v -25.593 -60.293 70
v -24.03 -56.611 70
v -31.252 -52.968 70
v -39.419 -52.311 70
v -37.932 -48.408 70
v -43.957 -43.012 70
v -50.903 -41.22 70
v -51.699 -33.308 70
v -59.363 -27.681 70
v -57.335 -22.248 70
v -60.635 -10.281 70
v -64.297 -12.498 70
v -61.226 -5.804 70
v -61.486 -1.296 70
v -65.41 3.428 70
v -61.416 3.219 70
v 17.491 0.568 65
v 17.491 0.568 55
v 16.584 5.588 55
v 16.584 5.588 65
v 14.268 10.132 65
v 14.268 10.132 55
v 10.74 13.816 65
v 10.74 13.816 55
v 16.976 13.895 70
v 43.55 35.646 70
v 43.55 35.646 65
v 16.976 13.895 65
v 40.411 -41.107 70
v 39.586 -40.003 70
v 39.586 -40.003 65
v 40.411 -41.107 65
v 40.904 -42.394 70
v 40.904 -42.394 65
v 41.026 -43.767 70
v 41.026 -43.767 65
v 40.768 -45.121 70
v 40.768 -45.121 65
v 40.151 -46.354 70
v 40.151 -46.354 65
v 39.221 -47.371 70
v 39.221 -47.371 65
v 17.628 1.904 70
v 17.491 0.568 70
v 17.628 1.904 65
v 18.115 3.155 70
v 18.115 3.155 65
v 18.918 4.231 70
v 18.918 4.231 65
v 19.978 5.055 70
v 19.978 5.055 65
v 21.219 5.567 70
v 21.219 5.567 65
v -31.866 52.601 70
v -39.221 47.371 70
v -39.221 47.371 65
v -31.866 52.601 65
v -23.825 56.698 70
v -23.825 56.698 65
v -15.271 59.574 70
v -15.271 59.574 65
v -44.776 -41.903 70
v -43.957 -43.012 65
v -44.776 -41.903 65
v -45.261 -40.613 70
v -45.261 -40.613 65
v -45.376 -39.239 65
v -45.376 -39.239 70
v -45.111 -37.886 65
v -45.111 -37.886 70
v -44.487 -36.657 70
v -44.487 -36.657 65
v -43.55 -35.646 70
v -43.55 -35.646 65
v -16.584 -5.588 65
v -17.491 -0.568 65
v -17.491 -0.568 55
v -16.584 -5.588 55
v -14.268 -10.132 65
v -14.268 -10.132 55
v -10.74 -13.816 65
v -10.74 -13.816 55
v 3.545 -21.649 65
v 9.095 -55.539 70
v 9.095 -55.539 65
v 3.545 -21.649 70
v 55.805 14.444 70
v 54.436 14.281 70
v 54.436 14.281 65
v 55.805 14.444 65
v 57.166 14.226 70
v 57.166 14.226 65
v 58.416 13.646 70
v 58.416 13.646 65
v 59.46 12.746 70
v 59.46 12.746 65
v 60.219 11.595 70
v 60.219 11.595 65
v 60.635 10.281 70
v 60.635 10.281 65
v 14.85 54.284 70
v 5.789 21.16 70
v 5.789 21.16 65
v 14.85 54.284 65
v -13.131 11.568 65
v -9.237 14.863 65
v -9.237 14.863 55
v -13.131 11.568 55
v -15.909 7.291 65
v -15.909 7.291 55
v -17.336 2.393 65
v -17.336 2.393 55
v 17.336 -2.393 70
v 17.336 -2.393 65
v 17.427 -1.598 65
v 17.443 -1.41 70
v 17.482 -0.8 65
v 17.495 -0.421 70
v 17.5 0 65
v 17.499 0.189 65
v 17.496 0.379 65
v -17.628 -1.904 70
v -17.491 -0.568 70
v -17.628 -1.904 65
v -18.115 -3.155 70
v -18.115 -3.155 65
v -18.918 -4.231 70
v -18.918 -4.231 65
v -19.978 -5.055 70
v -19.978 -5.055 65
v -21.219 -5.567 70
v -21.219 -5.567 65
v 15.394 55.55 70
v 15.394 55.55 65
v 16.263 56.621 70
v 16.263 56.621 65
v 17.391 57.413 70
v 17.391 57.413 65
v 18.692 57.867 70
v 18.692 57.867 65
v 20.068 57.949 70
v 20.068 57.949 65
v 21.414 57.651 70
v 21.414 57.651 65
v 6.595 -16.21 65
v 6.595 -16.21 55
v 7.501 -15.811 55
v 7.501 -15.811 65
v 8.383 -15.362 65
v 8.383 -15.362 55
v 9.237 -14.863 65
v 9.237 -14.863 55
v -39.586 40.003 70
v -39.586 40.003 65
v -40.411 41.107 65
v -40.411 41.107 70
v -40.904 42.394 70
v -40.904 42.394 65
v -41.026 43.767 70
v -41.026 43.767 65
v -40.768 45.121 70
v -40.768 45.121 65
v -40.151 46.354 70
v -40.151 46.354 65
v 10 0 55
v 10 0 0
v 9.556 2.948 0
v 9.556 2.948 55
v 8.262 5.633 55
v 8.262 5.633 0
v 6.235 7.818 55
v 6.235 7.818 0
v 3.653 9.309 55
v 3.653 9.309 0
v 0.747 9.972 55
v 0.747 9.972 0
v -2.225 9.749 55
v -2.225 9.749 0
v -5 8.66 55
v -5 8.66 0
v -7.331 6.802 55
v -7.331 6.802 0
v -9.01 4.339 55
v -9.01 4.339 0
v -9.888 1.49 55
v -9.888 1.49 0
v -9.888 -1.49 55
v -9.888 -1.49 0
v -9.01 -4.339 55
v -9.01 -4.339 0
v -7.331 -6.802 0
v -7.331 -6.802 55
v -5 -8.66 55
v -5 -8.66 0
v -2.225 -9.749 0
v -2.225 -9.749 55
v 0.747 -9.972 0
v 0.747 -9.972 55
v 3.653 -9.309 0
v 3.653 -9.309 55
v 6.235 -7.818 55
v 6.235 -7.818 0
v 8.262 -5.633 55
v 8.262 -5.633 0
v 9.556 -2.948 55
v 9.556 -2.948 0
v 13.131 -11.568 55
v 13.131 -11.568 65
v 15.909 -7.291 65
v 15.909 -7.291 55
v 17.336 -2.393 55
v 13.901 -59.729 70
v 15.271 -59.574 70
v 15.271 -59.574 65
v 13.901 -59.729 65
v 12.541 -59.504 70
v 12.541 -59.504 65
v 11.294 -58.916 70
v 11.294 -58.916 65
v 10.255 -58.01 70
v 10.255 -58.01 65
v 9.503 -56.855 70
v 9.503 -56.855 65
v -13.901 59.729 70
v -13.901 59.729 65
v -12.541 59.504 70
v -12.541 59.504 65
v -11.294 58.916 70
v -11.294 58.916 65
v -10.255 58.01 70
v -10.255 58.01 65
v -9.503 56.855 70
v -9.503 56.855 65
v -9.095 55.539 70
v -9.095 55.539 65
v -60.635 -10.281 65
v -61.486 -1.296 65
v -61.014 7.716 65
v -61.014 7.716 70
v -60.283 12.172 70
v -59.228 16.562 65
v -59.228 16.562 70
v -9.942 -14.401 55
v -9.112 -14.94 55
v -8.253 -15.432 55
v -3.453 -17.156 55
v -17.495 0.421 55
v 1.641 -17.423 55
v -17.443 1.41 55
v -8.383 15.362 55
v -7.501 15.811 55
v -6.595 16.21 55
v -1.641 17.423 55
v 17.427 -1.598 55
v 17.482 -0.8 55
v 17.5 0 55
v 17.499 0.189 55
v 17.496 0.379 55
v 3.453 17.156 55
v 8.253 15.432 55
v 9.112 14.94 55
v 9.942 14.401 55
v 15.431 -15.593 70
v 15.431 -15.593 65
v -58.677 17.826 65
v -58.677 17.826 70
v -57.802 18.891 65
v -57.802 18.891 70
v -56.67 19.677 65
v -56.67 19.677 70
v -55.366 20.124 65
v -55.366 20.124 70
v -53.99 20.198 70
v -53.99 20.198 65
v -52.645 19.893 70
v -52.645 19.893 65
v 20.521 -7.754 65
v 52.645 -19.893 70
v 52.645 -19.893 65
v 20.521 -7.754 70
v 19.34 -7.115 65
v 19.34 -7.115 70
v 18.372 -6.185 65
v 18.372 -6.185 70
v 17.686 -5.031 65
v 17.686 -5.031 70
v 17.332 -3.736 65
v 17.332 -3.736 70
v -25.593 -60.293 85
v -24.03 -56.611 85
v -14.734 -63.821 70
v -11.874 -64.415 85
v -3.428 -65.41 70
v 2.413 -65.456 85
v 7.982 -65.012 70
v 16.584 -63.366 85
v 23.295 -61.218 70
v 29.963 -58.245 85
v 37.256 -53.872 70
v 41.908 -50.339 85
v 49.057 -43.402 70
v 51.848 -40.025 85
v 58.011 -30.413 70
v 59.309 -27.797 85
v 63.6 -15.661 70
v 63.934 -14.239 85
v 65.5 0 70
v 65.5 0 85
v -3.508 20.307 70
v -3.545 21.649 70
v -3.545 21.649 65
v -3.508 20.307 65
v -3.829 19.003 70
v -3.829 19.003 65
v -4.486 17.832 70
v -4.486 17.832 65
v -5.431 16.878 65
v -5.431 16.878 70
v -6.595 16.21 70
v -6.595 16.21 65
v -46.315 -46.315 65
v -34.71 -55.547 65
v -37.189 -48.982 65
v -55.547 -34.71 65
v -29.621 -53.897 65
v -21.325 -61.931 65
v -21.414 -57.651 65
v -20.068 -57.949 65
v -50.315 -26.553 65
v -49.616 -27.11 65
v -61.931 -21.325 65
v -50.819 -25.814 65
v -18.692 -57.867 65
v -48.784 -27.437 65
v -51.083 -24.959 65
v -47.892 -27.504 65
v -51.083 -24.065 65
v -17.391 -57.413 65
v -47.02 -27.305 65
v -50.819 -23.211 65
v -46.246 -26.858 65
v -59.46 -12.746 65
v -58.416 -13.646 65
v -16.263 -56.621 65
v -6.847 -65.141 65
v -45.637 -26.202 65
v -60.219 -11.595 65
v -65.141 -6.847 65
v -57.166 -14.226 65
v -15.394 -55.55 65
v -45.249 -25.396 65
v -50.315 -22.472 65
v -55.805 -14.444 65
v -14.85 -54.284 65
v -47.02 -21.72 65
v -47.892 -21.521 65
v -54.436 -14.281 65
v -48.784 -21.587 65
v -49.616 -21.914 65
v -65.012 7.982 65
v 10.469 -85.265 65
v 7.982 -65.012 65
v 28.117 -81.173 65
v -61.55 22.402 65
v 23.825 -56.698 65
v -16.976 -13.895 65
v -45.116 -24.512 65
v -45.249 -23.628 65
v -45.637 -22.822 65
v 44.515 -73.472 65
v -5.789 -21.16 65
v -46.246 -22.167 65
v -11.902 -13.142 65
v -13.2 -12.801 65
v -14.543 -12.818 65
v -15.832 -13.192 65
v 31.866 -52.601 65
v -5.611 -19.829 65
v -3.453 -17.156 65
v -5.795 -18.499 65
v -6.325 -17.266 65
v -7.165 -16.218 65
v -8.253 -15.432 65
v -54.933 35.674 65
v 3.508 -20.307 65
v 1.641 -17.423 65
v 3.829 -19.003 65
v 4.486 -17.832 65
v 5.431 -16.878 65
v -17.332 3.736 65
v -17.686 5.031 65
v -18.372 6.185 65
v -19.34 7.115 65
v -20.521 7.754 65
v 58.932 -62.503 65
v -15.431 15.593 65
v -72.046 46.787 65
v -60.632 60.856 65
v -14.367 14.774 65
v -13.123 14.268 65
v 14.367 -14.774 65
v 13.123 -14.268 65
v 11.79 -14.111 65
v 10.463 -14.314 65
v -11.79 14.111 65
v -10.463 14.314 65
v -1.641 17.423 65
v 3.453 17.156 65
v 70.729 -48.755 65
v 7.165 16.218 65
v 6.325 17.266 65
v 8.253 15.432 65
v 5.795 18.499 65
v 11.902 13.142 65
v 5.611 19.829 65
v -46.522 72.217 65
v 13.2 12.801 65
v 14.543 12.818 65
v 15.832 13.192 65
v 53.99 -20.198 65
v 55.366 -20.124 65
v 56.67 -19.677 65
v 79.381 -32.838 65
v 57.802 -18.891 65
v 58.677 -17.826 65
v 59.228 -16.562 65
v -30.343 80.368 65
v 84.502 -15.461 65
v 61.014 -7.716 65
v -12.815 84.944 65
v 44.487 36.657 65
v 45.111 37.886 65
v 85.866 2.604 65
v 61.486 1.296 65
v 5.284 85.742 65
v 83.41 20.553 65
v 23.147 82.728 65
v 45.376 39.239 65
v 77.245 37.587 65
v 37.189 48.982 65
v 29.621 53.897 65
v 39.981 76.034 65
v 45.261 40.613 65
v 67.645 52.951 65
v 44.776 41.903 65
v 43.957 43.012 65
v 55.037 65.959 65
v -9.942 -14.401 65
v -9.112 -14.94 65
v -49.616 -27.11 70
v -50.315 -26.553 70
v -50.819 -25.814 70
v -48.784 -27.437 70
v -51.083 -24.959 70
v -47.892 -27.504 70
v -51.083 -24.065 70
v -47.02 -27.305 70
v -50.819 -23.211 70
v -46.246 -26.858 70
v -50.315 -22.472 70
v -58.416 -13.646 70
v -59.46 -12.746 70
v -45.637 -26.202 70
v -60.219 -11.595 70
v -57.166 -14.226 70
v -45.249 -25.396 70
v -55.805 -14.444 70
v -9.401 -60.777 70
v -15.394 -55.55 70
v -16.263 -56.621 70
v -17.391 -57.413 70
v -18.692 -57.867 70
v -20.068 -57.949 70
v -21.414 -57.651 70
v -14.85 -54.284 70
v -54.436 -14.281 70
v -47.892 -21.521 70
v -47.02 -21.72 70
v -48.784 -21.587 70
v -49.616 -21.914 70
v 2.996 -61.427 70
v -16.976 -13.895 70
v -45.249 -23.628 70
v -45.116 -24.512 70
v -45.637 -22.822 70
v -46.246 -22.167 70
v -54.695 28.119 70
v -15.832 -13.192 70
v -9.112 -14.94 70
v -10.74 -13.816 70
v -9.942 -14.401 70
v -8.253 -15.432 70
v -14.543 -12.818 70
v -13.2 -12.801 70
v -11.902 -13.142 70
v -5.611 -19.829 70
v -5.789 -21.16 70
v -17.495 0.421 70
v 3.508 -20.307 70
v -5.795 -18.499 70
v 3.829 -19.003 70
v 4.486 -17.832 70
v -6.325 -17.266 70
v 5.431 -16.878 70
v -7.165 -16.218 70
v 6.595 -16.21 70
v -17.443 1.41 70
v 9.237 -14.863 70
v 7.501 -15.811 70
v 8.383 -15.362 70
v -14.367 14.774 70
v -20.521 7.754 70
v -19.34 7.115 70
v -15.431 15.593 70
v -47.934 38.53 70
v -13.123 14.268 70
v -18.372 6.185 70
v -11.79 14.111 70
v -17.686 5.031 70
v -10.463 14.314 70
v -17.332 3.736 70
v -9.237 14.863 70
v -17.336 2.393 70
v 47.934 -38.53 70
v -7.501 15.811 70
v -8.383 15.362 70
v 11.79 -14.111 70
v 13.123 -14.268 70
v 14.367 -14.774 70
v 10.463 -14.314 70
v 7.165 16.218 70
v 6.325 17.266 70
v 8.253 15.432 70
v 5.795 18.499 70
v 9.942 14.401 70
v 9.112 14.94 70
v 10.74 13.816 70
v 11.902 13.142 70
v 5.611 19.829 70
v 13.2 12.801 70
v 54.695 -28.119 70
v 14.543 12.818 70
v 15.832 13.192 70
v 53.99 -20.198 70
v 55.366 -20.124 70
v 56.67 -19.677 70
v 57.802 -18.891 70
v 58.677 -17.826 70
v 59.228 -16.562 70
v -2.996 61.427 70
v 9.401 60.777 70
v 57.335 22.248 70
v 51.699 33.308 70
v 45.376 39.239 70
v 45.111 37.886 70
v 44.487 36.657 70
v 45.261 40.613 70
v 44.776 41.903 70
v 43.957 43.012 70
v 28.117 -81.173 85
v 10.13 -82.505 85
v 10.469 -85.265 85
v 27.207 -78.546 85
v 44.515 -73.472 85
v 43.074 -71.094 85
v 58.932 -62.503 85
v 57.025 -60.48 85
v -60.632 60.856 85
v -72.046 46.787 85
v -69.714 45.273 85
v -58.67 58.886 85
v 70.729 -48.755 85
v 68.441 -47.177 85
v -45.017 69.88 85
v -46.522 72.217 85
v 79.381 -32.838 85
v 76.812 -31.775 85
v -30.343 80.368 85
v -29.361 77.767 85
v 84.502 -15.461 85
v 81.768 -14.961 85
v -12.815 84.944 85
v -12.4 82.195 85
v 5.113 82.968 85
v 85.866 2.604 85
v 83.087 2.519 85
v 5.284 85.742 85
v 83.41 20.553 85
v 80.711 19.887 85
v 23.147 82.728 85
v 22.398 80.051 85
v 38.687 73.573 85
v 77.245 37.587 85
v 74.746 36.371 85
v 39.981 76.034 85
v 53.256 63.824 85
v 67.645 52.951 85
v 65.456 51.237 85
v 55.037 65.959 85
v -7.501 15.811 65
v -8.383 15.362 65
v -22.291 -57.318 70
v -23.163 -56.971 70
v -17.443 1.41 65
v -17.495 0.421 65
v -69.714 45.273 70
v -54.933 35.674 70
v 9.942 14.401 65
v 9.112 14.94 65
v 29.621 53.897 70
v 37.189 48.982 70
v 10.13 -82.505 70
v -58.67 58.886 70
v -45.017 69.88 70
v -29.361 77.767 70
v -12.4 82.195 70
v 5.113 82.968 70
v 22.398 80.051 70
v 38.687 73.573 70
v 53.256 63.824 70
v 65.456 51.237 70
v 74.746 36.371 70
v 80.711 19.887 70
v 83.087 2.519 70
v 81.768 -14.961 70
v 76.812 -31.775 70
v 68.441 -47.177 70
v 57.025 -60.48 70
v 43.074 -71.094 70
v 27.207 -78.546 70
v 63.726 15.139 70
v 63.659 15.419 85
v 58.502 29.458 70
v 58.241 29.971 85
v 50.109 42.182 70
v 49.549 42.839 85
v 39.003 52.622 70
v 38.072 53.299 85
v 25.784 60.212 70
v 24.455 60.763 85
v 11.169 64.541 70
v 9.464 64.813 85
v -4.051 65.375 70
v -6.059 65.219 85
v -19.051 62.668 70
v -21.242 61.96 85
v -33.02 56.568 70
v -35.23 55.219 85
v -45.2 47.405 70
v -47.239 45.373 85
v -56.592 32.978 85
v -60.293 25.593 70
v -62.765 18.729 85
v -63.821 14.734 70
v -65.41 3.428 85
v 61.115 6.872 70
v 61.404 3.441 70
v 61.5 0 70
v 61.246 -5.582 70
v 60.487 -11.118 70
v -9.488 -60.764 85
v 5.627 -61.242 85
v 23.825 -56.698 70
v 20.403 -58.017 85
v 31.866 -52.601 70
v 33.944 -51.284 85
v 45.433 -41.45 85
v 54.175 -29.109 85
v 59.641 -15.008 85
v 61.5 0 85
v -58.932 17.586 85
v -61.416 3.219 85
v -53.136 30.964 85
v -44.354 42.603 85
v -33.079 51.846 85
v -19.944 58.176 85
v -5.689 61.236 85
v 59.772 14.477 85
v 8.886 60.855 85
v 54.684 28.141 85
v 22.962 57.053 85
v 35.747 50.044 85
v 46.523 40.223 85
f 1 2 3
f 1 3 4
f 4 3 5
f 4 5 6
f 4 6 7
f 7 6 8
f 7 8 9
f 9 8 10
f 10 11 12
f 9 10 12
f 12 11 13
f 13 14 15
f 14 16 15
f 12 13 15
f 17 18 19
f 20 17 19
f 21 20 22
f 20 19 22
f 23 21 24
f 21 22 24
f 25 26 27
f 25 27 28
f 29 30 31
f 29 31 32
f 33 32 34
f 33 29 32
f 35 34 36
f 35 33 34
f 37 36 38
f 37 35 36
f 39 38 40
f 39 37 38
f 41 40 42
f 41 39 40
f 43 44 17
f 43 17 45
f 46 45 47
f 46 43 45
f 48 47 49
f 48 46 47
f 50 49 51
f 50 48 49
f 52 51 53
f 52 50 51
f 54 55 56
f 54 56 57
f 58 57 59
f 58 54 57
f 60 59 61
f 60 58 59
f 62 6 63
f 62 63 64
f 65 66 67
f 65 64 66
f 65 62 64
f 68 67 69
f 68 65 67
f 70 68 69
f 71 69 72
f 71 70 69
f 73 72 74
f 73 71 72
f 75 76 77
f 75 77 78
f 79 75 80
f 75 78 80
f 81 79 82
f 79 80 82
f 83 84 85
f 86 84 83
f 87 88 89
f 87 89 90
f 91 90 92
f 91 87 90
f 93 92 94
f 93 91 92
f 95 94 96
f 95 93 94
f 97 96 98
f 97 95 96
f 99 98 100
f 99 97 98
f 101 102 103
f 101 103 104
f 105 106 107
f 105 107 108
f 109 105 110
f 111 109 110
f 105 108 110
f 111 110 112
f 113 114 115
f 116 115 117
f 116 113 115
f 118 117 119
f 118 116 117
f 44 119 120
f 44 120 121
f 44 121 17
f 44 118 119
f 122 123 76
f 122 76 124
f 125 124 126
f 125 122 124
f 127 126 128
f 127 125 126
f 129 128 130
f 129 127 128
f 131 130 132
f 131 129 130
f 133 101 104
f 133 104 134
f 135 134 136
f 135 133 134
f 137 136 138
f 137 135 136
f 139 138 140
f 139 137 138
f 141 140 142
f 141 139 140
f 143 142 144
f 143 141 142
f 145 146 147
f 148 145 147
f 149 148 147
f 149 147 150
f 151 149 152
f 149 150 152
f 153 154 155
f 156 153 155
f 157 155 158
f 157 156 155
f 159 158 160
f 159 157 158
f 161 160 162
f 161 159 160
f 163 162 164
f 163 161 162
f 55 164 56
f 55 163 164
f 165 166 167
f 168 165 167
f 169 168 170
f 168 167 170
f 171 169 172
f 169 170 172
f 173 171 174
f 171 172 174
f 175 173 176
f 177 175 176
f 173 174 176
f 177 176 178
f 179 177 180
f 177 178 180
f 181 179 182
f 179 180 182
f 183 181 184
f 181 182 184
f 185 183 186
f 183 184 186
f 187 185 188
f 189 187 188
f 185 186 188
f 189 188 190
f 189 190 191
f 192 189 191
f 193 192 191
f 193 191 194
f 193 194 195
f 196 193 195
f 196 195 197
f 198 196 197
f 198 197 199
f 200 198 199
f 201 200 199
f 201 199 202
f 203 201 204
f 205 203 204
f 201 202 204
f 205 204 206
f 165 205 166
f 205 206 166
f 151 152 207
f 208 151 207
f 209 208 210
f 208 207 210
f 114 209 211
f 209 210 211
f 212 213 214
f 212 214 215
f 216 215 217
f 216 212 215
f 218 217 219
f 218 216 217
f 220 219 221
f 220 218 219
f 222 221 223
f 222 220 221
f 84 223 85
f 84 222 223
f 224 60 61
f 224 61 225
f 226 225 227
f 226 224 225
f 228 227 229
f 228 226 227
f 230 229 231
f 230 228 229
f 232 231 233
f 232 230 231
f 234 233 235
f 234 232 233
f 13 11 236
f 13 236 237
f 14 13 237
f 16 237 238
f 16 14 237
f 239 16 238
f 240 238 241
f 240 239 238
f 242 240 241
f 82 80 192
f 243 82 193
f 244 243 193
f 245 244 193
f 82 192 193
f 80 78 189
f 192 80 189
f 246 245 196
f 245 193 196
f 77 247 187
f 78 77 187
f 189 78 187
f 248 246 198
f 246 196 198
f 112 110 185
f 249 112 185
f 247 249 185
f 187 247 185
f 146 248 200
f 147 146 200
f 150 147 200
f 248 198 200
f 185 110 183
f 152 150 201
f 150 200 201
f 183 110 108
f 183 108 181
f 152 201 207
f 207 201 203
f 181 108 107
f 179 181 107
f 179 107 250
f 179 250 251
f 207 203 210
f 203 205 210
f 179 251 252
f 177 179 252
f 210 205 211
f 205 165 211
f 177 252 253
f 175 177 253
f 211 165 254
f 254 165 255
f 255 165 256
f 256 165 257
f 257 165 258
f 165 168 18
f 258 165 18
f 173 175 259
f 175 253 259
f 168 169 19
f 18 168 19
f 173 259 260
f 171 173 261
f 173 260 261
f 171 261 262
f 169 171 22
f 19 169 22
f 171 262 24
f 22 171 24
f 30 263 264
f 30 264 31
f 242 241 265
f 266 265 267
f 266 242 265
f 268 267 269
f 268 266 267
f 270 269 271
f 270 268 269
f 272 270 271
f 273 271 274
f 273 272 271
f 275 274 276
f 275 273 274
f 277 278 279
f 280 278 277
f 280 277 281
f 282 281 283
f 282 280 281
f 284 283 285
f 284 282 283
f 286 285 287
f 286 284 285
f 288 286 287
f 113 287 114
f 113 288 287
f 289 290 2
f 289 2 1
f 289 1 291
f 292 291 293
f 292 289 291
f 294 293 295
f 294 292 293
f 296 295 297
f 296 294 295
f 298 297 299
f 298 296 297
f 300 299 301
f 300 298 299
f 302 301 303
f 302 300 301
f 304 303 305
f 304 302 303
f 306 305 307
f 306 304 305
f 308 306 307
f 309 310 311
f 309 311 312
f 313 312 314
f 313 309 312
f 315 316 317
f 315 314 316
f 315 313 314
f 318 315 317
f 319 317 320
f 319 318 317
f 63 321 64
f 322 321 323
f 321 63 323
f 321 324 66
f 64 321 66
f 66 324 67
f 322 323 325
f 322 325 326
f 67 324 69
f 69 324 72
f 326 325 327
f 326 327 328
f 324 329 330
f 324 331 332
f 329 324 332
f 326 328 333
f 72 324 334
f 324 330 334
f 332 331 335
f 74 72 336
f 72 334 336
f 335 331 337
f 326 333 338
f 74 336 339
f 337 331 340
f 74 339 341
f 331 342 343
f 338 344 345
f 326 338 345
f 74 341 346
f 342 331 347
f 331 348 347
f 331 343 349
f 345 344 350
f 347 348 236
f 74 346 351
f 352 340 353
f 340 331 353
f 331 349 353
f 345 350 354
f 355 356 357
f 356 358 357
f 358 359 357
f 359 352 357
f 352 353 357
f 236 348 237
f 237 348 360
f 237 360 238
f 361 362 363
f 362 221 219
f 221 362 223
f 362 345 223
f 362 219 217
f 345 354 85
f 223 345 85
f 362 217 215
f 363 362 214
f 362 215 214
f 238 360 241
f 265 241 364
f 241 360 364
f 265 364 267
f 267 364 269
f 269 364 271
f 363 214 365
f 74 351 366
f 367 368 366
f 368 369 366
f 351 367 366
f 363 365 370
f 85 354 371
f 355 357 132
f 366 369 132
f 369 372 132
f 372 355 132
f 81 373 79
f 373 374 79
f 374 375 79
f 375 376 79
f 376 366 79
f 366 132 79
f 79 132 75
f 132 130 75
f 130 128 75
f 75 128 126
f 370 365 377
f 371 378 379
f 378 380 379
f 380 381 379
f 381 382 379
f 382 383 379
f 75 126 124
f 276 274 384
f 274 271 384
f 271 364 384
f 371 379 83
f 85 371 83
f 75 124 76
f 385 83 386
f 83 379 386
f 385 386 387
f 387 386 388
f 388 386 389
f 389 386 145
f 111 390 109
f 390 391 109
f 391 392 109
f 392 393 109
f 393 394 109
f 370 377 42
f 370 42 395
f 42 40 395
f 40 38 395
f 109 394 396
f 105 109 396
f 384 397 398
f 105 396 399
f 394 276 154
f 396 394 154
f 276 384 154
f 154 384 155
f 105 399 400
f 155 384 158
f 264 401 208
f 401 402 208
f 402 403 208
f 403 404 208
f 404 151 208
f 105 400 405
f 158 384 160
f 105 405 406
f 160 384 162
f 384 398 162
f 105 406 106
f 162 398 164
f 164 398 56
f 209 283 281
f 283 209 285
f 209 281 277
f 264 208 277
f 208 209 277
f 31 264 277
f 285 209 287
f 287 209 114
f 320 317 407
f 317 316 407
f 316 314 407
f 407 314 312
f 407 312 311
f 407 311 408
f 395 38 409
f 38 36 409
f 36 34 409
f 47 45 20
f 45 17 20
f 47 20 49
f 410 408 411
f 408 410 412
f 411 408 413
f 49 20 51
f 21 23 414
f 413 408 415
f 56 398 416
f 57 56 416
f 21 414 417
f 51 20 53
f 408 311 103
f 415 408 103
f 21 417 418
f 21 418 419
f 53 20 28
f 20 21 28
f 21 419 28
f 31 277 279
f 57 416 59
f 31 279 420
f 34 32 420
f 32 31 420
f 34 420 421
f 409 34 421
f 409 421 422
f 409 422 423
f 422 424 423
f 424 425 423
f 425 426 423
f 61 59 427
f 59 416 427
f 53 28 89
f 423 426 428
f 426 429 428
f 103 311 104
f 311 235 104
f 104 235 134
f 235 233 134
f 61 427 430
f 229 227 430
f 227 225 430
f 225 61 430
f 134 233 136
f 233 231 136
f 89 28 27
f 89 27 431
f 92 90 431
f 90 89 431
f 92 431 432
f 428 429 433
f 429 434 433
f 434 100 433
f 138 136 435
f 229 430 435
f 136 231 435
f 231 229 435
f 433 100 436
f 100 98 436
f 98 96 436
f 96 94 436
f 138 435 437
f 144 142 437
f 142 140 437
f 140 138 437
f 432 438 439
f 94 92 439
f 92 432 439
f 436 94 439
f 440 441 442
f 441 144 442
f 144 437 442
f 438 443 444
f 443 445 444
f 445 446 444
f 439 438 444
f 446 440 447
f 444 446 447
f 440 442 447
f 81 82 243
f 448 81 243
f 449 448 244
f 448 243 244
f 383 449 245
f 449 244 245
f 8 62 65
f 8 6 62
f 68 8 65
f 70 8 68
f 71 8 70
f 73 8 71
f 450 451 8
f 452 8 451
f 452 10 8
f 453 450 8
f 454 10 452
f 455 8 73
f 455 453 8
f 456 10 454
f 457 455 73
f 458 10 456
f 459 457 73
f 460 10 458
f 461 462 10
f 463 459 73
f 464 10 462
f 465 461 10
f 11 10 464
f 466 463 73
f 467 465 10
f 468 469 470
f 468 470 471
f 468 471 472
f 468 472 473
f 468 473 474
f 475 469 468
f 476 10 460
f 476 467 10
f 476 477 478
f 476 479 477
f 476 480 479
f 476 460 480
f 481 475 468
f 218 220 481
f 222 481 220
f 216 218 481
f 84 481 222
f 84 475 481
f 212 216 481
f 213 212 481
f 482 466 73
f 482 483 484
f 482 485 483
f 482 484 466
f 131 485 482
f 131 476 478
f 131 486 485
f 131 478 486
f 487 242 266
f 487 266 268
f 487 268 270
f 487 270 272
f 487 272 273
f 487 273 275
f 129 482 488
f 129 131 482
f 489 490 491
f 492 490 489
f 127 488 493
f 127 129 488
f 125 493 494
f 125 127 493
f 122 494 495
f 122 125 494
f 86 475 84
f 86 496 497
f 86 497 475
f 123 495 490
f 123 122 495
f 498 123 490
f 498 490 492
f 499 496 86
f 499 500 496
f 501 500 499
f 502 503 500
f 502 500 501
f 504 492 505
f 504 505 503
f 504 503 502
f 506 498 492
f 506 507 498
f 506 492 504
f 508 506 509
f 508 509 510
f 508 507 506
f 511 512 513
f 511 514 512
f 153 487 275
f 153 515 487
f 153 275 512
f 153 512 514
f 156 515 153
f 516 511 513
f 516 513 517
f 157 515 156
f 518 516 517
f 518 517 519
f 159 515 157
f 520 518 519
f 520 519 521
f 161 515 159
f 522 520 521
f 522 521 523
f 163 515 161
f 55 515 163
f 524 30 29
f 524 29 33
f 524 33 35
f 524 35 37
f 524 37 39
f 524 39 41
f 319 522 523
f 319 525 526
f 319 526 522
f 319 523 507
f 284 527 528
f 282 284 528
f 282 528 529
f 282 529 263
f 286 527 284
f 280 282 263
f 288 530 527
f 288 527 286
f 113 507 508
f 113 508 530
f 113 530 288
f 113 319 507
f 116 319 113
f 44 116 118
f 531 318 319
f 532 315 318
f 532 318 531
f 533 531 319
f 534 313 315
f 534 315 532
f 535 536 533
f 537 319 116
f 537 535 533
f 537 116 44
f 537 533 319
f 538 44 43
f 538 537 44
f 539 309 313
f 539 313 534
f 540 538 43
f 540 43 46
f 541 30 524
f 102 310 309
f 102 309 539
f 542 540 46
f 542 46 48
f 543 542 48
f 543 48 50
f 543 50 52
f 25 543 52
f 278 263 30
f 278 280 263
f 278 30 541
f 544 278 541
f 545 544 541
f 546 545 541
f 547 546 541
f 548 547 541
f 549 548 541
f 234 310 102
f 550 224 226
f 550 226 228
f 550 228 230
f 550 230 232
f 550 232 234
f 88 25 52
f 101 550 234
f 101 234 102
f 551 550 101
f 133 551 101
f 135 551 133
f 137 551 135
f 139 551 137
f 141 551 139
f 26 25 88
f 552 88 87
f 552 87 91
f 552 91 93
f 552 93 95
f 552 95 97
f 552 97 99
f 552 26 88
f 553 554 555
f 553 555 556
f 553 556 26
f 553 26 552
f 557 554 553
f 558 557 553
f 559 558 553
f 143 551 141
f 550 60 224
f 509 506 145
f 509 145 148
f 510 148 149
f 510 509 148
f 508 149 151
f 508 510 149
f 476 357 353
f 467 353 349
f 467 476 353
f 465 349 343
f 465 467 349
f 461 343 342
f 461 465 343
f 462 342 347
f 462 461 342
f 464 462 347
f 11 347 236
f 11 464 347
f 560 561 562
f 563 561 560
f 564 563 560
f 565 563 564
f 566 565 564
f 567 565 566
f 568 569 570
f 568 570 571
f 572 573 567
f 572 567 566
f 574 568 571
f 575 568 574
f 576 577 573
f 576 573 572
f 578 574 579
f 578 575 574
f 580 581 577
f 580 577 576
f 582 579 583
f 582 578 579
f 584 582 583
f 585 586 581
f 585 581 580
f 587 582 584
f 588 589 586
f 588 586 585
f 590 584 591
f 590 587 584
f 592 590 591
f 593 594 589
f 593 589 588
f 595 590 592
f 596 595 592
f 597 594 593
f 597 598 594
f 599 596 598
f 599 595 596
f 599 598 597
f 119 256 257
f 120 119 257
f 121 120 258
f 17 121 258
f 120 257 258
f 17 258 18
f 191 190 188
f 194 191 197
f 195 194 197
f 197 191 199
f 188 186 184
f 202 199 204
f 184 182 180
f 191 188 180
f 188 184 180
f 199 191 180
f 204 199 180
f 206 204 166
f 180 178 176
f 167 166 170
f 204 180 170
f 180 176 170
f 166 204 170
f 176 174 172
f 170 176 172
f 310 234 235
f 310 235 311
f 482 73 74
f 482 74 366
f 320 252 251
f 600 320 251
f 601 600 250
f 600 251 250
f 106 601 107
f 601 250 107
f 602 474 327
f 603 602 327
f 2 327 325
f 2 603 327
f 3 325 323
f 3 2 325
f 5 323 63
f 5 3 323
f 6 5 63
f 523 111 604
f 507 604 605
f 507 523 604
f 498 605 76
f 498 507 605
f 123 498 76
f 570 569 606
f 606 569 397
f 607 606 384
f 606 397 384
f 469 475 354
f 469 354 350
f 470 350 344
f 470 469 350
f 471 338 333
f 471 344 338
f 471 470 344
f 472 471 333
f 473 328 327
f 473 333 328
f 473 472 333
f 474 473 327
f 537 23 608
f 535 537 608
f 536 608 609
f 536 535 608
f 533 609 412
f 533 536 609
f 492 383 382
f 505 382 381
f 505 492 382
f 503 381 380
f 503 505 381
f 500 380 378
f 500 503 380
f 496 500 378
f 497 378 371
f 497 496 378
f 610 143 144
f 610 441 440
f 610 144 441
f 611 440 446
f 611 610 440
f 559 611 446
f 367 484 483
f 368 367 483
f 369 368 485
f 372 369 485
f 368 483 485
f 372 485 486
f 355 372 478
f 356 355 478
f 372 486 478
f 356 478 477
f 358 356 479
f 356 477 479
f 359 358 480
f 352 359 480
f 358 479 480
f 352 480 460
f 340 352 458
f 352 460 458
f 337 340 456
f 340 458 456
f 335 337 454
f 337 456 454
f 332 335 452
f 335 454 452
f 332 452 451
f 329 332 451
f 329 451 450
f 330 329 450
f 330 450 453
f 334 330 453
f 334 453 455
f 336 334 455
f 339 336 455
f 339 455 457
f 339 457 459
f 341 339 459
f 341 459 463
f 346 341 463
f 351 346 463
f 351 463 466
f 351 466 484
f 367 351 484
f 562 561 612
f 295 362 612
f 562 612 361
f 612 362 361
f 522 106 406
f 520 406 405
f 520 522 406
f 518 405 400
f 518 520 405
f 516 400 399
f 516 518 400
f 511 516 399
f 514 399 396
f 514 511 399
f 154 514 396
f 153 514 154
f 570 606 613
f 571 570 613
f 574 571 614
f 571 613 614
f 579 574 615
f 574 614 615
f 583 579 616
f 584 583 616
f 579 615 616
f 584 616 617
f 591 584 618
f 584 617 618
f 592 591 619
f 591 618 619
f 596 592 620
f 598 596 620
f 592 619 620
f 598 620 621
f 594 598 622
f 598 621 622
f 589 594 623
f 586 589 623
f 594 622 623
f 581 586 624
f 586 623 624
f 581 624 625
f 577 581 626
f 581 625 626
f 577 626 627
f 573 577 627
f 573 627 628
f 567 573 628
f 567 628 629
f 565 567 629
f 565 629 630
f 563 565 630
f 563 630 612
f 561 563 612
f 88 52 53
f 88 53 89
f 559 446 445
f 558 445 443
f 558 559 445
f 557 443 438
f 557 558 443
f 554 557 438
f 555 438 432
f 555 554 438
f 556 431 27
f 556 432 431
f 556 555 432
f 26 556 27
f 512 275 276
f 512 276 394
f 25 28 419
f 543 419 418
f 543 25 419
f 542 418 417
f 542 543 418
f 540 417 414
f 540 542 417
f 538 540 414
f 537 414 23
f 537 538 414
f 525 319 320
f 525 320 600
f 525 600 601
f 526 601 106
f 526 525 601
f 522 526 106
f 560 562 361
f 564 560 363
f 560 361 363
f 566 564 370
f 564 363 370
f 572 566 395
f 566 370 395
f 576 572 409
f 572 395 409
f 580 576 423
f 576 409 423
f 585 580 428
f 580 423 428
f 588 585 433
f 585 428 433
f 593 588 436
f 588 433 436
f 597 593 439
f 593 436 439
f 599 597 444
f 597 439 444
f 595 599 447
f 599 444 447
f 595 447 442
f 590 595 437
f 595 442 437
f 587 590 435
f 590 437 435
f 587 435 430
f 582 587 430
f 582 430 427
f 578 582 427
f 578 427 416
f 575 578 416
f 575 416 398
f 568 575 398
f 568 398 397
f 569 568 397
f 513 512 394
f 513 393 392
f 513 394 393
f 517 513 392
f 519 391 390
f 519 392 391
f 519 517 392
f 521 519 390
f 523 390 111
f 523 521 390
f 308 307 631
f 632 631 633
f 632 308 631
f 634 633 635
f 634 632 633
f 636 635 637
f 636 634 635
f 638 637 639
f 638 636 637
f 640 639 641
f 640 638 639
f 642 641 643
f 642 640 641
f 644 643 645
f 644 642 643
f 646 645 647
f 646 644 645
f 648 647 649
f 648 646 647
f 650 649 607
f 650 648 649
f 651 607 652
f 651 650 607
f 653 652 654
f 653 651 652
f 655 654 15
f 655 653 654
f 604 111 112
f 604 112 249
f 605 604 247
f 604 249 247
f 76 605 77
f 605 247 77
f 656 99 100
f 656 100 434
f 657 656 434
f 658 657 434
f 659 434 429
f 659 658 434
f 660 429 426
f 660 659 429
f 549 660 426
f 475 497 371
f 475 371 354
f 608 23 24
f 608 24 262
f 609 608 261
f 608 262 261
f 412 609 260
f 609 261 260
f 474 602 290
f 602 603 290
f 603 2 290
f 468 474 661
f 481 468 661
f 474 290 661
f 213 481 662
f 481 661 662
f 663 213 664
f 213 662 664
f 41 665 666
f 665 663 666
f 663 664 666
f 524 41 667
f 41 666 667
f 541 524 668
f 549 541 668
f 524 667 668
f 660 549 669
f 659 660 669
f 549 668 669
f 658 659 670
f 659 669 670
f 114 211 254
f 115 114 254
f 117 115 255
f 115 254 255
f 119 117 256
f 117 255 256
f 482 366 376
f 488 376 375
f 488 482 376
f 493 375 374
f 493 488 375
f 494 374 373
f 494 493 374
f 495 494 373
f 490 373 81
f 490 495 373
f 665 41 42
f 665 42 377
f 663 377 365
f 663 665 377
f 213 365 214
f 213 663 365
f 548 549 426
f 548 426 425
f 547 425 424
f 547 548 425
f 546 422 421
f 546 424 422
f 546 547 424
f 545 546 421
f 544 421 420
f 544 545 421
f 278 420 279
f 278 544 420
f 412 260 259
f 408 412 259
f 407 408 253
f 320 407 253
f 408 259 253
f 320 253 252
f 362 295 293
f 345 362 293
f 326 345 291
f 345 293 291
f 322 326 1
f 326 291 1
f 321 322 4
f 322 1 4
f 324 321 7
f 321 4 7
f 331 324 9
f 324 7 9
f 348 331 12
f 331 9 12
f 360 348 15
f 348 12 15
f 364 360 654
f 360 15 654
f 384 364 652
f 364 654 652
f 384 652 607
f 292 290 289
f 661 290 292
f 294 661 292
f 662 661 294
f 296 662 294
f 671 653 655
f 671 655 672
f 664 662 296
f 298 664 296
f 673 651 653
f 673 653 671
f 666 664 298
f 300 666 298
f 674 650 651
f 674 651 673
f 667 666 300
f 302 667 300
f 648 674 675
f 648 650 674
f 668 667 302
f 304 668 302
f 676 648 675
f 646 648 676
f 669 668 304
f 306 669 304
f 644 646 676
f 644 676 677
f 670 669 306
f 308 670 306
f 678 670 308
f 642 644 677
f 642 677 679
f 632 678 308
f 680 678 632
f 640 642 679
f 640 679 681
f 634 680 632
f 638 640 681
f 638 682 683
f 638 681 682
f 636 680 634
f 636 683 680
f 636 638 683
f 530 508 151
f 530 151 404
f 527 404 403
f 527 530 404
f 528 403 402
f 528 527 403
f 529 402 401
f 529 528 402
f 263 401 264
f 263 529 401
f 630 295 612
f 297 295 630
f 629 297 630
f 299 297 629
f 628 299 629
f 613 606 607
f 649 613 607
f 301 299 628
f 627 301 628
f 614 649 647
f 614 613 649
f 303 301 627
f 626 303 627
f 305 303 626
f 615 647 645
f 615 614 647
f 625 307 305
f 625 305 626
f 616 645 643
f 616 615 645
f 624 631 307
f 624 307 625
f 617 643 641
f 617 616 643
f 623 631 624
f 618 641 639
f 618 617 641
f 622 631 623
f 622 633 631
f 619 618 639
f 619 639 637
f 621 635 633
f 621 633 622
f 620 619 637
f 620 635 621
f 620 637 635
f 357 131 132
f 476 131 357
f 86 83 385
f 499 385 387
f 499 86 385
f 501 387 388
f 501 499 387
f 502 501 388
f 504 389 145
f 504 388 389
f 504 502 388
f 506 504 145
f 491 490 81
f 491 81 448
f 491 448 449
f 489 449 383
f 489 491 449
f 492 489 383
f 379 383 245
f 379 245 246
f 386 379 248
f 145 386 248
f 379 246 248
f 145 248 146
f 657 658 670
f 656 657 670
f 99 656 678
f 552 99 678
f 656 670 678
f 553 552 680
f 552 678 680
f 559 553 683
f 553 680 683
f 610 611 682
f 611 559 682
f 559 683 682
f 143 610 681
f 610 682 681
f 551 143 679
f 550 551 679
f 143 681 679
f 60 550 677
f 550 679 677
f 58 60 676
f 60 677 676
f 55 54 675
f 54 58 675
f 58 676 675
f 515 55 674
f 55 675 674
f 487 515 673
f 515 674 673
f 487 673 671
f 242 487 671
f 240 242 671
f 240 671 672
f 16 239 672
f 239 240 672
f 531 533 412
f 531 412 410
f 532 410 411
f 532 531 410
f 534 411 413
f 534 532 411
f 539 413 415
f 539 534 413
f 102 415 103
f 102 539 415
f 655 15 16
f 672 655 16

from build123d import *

# Parameters (mm, degrees)
SCHIZZO1_R                   = 10.000000000000002
ESTRUSIONE_ESTRUSIONE1_DEPTH = 55
SCHIZZO2_R                   = 17.500000000000004
ESTRUSIONE_ESTRUSIONE2_DEPTH = 10
SCHIZZO3_R                   = 85.905
ESTRUSIONE_ESTRUSIONE3_DEPTH = 5
ESTRUSIONE_ESTRUSIONE4_DEPTH = 15
TAGLIO_ESTRUSIONE1_DEPTH     = 141.2117614538809
ESTRUSIONE_ESTRUSIONE5_START = 15
SCHIZZO6_R                   = 65.50000000000003
SCHIZZO6_R_2                 = 61.50000000000001
ESTRUSIONE_ESTRUSIONE5_DEPTH = 15
TAGLIO_ESTRUSIONE2_DEPTH     = 141.2117614538809
TAGLIO_ESTRUSIONE3_DEPTH     = 15
SCHIZZO9_R                   = 3.0000000000000018
TAGLIO_ESTRUSIONE4_DEPTH     = 141.2117614538809


with BuildPart() as part:
    # Schizzo1 → Estrusione-Estrusione1 (new body)
    with BuildSketch(Plane.XY):
        Circle(SCHIZZO1_R)
    extrude(amount=ESTRUSIONE_ESTRUSIONE1_DEPTH)

    # Schizzo2 → Estrusione-Estrusione2 (add)
    with BuildSketch(Plane.XY.offset(55)):
        Circle(SCHIZZO2_R)
    extrude(amount=ESTRUSIONE_ESTRUSIONE2_DEPTH)

    # Schizzo3 → Estrusione-Estrusione3 (add)
    with BuildSketch(Plane.XY.offset(65)):
        Circle(SCHIZZO3_R)
    extrude(amount=ESTRUSIONE_ESTRUSIONE3_DEPTH)

    # Schizzo4 → Estrusione-Estrusione4 (add)
    with BuildSketch(Plane.XY.offset(70)):
        with BuildLine():
            ThreePointArc((2.33238e-12, 85.905), (-40.99032330010046, 75.49478406322679), (-72.04599513935142, 46.78721630296627))
            Line((-72.0459951393514, 46.78721630296625), (-69.71449096046315, 45.27311978562447))
            ThreePointArc((-69.71449096046314, 45.27311978562449), (-39.66382194658025, 73.05167249002571), (-1.12081e-12, 83.125))
            Line((0, 83.125), (0, 85.905))
        make_face()
        with BuildLine():
            Line((10.130389170552856, -82.5053988551849), (10.469185945219174, -85.26467715674777))
            ThreePointArc((10.469185945219136, -85.26467715674778), (64.3390411943792, -56.92237524197296), (85.905, -2.104e-14))
            ThreePointArc((85.905, 0), (60.74400803783119, 60.74400803782954), (2.33238e-12, 85.905))
            Line((0, 85.905), (0, 83.125))
            ThreePointArc((-1.10236e-12, 83.125), (58.77825118613137, 58.77825118613215), (83.125, 0))
            ThreePointArc((83.125, -2.036e-14), (62.25694429058578, -55.08029150793321), (10.130389170552828, -82.5053988551849))
        make_face()
    extrude(amount=ESTRUSIONE_ESTRUSIONE4_DEPTH)

    # Schizzo5 → Taglio-Estrusione1 (cut, through all)
    with BuildSketch(Plane.XY.offset(70)):
        with BuildLine():
            Line((-69.7144909604632, 45.27311978562441), (-72.04599513935146, 46.78721630296619))
            ThreePointArc((-72.04599513935142, 46.787216302966286), (-72.85157170031785, -45.522714393953365), (10.469185945219396, -85.26467715674775))
            Line((10.469185945218987, -85.26467715674781), (10.130389170552684, -82.50539885518494))
            Line((10.130389170552684, -82.50539885518494), (7.982441993037, -65.0117729325066))
            ThreePointArc((7.9824419930370025, -65.01177293250663), (-55.54715029824602, -34.70971180727477), (-54.932922200425146, 35.67385679348449))
            Line((-54.93292220042516, 35.67385679348449), (-69.7144909604632, 45.27311978562441))
        make_face()
    extrude(amount=-TAGLIO_ESTRUSIONE1_DEPTH, mode=Mode.SUBTRACT)

    # Schizzo6 → Estrusione-Estrusione5 (add)
    with BuildSketch(Plane.XY.offset(70).offset(ESTRUSIONE_ESTRUSIONE5_START)):
        Circle(SCHIZZO6_R)
        Circle(SCHIZZO6_R_2, mode=Mode.SUBTRACT)
    extrude(amount=-ESTRUSIONE_ESTRUSIONE5_DEPTH)

    # Schizzo7 → Taglio-Estrusione2 (cut, through all)
    with BuildSketch(Plane.XY.offset(70)):
        with BuildLine():
            Line((-9.094792559402517, 55.53858792138523), (-3.5451694376210634, 21.649059417410207))
            ThreePointArc((-3.5451694376210634, 21.649059417410207), (-4.118256573097941, 18.39563458554113), (-6.595126237509526, 16.209698020361557))
            ThreePointArc((-6.595126237509526, 16.209698020361557), (-7.944833745441985, 15.59261417329648), (-9.237403232743027, 14.863390646676436))
            ThreePointArc((-9.237403232743027, 14.863390646676436), (-12.461730523190647, 14.144422270775147), (-15.430658668606016, 15.59310017453149))
            Line((-15.430658668606016, 15.59310017453149), (-39.58587653291128, 40.00260465421101))
            ThreePointArc((-39.58587653291128, 40.00260465421101), (-41.025744459915046, 43.76718552220088), (-39.2205410364265, 47.37086827164967))
            ThreePointArc((-39.2205410364265, 47.37086827164967), (-27.92041573398183, 54.796901237584784), (-15.27058186191767, 59.57398198541434))
            ThreePointArc((-15.27058186191767, 59.57398198541434), (-11.294069325563324, 58.91623065925357), (-9.094792559402517, 55.53858792138523))
        make_face()
        with BuildLine():
            Line((43.550431750534024, 35.64561535928479), (16.976050704705482, 13.894736502405099))
            ThreePointArc((16.976050704705482, 13.894736502405099), (13.871958583265304, 12.764332104375594), (10.740447154552704, 13.816395873029286))
            ThreePointArc((10.740447154552704, 13.816395873029286), (9.53118311276309, 14.676734939044845), (8.253372270022329, 15.431521187894159))
            ThreePointArc((8.253372270022329, 15.431521187894159), (6.018563746750371, 17.864386343586606), (5.788691540596875, 21.159892491405103))
            Line((5.788691540596875, 21.159892491405103), (14.850333581636846, 54.28367703568089))
            ThreePointArc((14.850333581636846, 54.28367703568089), (17.390622284415066, 57.41292967255552), (21.41410480436174, 57.65141902354019))
            ThreePointArc((21.41410480436174, 57.65141902354019), (33.495300653424565, 51.578239928643306), (43.95729087300659, 43.011702815697646))
            ThreePointArc((43.95729087300659, 43.011702815697646), (45.37591778335563, 39.239066277667106), (43.550431750534024, 35.64561535928479))
        make_face()
        with BuildLine():
            Line((52.645224309936374, -19.89297256210059), (20.52122014232648, -7.754322915005166))
            ThreePointArc((20.52122014232648, -7.754322915005166), (17.990215156363192, -5.631302481165585), (17.335573392062187, -2.3933021473323244))
            ThreePointArc((17.335573392062187, -2.3933021473323244), (17.476016858205035, -0.9158792342516949), (17.49077550276533, 0.5681305412176627))
            ThreePointArc((17.49077550276533, 0.5681305412176627), (18.480294269940998, 3.7199640728113863), (21.21935020920287, 5.566792316873533))
            Line((21.21935020920287, 5.566792316873533), (54.436210114548075, 14.281072381469665))
            ThreePointArc((54.436210114548075, 14.281072381469665), (58.416366744330055, 13.64574415035441), (60.634645840788174, 10.280550751890294))
            ThreePointArc((60.634645840788174, 10.280550751890294), (61.41571638740626, -3.2186613089416714), (59.2278727349241, -16.562279169716877))
            ThreePointArc((59.2278727349241, -16.562279169716877), (56.66998710891878, -19.67716438158663), (52.645224309936374, -19.89297256210059))
        make_face()
        with BuildLine():
            Line((9.094792559402126, -55.538587921385286), (3.54516943762091, -21.649059417410225))
            ThreePointArc((3.54516943762091, -21.649059417410225), (4.118256573097811, -18.395634585541153), (6.595126237509411, -16.209698020361596))
            ThreePointArc((6.595126237509411, -16.209698020361596), (7.944833745441873, -15.592614173296528), (9.237403232742922, -14.863390646676493))
            ThreePointArc((9.237403232742922, -14.863390646676493), (12.461730523190546, -14.144422270775227), (15.430658668605904, -15.593100174531589))
            Line((15.430658668605904, -15.593100174531589), (39.585876532911, -40.00260465421129))
            ThreePointArc((39.585876532911, -40.00260465421129), (41.02574445991474, -43.76718552220117), (39.22054103642617, -47.37086827164993))
            ThreePointArc((39.22054103642617, -47.37086827164993), (27.92041573398144, -54.79690123758496), (15.27058186191725, -59.57398198541444))
            ThreePointArc((15.27058186191725, -59.57398198541444), (11.29406932556291, -58.91623065925364), (9.094792559402126, -55.538587921385286))
        make_face()
        with BuildLine():
            Line((-43.55043175053426, -35.645615359284484), (-16.976050704705578, -13.89473650240498))
            ThreePointArc((-16.976050704705578, -13.89473650240498), (-13.87195858326539, -12.764332104375498), (-10.740447154552799, -13.816395873029213))
            ThreePointArc((-10.740447154552799, -13.816395873029213), (-9.53118311276319, -14.676734939044781), (-8.253372270022437, -15.4315211878941))
            ThreePointArc((-8.253372270022437, -15.4315211878941), (-6.018563746750495, -17.86438634358656), (-5.7886915405970205, -21.159892491405063))
            Line((-5.7886915405970205, -21.159892491405063), (-14.850333581637225, -54.283677035680796))
            ThreePointArc((-14.850333581637225, -54.283677035680796), (-17.39062228441547, -57.41292967255541), (-21.414104804362143, -57.65141902354005))
            ThreePointArc((-21.414104804362143, -57.65141902354005), (-33.49530065342495, -51.57823992864311), (-43.9572908730069, -43.01170281569734))
            ThreePointArc((-43.9572908730069, -43.01170281569734), (-45.375917783355895, -39.23906627766678), (-43.55043175053426, -35.645615359284484))
        make_face()
        with BuildLine():
            Line((-52.64522430993622, 19.892972562100955), (-20.52122014232642, 7.754322915005307))
            ThreePointArc((-20.52122014232642, 7.754322915005307), (-17.990215156363146, 5.631302481165709), (-17.335573392062166, 2.393302147332444))
            ThreePointArc((-17.335573392062166, 2.393302147332444), (-17.47601685820502, 0.915879234251819), (-17.49077550276533, -0.5681305412175421))
            ThreePointArc((-17.49077550276533, -0.5681305412175421), (-18.480294269941023, -3.7199640728112584), (-21.219350209202908, -5.566792316873385))
            Line((-21.219350209202908, -5.566792316873385), (-54.43621011454816, -14.281072381469283))
            ThreePointArc((-54.43621011454816, -14.281072381469283), (-58.41636674433013, -13.645744150354004), (-60.63464584078823, -10.280550751889873))
            ThreePointArc((-60.63464584078823, -10.280550751889873), (-61.41571638740626, 3.218661308942107), (-59.22787273492397, 16.562279169717286))
            ThreePointArc((-59.22787273492397, 16.562279169717286), (-56.66998710891863, 19.677164381587026), (-52.64522430993622, 19.892972562100955))
        make_face()
    extrude(amount=-TAGLIO_ESTRUSIONE2_DEPTH, mode=Mode.SUBTRACT)

    # Schizzo8 → Taglio-Estrusione3 (cut)
    with BuildSketch(Plane.XY.offset(85)):
        with BuildLine():
            Line((-65.41023452642462, 3.4280051339130924), (-61.41571638740627, 3.2186613089413))
            ThreePointArc((-61.41571638740627, 3.2186613089413), (-52.15495791361932, -32.590034750342085), (-24.029964402089327, -56.61104848732551))
            Line((-24.029964402089327, -56.61104848732551), (-25.592888916046377, -60.29306790113534))
            ThreePointArc((-25.592888916046377, -60.29306790113534), (-55.547150298245406, -34.709711807275156), (-65.41023452642462, 3.4280051339130924))
        make_face()
    extrude(amount=-TAGLIO_ESTRUSIONE3_DEPTH, mode=Mode.SUBTRACT)

    # Schizzo9 → Taglio-Estrusione4 (cut, through all)
    with BuildSketch(Plane.XY.offset(70)):
        with Locations((-48.11604392732846, -24.512166709277214)):
            Circle(SCHIZZO9_R)
    extrude(amount=-TAGLIO_ESTRUSIONE4_DEPTH, mode=Mode.SUBTRACT)


solid = part.part
